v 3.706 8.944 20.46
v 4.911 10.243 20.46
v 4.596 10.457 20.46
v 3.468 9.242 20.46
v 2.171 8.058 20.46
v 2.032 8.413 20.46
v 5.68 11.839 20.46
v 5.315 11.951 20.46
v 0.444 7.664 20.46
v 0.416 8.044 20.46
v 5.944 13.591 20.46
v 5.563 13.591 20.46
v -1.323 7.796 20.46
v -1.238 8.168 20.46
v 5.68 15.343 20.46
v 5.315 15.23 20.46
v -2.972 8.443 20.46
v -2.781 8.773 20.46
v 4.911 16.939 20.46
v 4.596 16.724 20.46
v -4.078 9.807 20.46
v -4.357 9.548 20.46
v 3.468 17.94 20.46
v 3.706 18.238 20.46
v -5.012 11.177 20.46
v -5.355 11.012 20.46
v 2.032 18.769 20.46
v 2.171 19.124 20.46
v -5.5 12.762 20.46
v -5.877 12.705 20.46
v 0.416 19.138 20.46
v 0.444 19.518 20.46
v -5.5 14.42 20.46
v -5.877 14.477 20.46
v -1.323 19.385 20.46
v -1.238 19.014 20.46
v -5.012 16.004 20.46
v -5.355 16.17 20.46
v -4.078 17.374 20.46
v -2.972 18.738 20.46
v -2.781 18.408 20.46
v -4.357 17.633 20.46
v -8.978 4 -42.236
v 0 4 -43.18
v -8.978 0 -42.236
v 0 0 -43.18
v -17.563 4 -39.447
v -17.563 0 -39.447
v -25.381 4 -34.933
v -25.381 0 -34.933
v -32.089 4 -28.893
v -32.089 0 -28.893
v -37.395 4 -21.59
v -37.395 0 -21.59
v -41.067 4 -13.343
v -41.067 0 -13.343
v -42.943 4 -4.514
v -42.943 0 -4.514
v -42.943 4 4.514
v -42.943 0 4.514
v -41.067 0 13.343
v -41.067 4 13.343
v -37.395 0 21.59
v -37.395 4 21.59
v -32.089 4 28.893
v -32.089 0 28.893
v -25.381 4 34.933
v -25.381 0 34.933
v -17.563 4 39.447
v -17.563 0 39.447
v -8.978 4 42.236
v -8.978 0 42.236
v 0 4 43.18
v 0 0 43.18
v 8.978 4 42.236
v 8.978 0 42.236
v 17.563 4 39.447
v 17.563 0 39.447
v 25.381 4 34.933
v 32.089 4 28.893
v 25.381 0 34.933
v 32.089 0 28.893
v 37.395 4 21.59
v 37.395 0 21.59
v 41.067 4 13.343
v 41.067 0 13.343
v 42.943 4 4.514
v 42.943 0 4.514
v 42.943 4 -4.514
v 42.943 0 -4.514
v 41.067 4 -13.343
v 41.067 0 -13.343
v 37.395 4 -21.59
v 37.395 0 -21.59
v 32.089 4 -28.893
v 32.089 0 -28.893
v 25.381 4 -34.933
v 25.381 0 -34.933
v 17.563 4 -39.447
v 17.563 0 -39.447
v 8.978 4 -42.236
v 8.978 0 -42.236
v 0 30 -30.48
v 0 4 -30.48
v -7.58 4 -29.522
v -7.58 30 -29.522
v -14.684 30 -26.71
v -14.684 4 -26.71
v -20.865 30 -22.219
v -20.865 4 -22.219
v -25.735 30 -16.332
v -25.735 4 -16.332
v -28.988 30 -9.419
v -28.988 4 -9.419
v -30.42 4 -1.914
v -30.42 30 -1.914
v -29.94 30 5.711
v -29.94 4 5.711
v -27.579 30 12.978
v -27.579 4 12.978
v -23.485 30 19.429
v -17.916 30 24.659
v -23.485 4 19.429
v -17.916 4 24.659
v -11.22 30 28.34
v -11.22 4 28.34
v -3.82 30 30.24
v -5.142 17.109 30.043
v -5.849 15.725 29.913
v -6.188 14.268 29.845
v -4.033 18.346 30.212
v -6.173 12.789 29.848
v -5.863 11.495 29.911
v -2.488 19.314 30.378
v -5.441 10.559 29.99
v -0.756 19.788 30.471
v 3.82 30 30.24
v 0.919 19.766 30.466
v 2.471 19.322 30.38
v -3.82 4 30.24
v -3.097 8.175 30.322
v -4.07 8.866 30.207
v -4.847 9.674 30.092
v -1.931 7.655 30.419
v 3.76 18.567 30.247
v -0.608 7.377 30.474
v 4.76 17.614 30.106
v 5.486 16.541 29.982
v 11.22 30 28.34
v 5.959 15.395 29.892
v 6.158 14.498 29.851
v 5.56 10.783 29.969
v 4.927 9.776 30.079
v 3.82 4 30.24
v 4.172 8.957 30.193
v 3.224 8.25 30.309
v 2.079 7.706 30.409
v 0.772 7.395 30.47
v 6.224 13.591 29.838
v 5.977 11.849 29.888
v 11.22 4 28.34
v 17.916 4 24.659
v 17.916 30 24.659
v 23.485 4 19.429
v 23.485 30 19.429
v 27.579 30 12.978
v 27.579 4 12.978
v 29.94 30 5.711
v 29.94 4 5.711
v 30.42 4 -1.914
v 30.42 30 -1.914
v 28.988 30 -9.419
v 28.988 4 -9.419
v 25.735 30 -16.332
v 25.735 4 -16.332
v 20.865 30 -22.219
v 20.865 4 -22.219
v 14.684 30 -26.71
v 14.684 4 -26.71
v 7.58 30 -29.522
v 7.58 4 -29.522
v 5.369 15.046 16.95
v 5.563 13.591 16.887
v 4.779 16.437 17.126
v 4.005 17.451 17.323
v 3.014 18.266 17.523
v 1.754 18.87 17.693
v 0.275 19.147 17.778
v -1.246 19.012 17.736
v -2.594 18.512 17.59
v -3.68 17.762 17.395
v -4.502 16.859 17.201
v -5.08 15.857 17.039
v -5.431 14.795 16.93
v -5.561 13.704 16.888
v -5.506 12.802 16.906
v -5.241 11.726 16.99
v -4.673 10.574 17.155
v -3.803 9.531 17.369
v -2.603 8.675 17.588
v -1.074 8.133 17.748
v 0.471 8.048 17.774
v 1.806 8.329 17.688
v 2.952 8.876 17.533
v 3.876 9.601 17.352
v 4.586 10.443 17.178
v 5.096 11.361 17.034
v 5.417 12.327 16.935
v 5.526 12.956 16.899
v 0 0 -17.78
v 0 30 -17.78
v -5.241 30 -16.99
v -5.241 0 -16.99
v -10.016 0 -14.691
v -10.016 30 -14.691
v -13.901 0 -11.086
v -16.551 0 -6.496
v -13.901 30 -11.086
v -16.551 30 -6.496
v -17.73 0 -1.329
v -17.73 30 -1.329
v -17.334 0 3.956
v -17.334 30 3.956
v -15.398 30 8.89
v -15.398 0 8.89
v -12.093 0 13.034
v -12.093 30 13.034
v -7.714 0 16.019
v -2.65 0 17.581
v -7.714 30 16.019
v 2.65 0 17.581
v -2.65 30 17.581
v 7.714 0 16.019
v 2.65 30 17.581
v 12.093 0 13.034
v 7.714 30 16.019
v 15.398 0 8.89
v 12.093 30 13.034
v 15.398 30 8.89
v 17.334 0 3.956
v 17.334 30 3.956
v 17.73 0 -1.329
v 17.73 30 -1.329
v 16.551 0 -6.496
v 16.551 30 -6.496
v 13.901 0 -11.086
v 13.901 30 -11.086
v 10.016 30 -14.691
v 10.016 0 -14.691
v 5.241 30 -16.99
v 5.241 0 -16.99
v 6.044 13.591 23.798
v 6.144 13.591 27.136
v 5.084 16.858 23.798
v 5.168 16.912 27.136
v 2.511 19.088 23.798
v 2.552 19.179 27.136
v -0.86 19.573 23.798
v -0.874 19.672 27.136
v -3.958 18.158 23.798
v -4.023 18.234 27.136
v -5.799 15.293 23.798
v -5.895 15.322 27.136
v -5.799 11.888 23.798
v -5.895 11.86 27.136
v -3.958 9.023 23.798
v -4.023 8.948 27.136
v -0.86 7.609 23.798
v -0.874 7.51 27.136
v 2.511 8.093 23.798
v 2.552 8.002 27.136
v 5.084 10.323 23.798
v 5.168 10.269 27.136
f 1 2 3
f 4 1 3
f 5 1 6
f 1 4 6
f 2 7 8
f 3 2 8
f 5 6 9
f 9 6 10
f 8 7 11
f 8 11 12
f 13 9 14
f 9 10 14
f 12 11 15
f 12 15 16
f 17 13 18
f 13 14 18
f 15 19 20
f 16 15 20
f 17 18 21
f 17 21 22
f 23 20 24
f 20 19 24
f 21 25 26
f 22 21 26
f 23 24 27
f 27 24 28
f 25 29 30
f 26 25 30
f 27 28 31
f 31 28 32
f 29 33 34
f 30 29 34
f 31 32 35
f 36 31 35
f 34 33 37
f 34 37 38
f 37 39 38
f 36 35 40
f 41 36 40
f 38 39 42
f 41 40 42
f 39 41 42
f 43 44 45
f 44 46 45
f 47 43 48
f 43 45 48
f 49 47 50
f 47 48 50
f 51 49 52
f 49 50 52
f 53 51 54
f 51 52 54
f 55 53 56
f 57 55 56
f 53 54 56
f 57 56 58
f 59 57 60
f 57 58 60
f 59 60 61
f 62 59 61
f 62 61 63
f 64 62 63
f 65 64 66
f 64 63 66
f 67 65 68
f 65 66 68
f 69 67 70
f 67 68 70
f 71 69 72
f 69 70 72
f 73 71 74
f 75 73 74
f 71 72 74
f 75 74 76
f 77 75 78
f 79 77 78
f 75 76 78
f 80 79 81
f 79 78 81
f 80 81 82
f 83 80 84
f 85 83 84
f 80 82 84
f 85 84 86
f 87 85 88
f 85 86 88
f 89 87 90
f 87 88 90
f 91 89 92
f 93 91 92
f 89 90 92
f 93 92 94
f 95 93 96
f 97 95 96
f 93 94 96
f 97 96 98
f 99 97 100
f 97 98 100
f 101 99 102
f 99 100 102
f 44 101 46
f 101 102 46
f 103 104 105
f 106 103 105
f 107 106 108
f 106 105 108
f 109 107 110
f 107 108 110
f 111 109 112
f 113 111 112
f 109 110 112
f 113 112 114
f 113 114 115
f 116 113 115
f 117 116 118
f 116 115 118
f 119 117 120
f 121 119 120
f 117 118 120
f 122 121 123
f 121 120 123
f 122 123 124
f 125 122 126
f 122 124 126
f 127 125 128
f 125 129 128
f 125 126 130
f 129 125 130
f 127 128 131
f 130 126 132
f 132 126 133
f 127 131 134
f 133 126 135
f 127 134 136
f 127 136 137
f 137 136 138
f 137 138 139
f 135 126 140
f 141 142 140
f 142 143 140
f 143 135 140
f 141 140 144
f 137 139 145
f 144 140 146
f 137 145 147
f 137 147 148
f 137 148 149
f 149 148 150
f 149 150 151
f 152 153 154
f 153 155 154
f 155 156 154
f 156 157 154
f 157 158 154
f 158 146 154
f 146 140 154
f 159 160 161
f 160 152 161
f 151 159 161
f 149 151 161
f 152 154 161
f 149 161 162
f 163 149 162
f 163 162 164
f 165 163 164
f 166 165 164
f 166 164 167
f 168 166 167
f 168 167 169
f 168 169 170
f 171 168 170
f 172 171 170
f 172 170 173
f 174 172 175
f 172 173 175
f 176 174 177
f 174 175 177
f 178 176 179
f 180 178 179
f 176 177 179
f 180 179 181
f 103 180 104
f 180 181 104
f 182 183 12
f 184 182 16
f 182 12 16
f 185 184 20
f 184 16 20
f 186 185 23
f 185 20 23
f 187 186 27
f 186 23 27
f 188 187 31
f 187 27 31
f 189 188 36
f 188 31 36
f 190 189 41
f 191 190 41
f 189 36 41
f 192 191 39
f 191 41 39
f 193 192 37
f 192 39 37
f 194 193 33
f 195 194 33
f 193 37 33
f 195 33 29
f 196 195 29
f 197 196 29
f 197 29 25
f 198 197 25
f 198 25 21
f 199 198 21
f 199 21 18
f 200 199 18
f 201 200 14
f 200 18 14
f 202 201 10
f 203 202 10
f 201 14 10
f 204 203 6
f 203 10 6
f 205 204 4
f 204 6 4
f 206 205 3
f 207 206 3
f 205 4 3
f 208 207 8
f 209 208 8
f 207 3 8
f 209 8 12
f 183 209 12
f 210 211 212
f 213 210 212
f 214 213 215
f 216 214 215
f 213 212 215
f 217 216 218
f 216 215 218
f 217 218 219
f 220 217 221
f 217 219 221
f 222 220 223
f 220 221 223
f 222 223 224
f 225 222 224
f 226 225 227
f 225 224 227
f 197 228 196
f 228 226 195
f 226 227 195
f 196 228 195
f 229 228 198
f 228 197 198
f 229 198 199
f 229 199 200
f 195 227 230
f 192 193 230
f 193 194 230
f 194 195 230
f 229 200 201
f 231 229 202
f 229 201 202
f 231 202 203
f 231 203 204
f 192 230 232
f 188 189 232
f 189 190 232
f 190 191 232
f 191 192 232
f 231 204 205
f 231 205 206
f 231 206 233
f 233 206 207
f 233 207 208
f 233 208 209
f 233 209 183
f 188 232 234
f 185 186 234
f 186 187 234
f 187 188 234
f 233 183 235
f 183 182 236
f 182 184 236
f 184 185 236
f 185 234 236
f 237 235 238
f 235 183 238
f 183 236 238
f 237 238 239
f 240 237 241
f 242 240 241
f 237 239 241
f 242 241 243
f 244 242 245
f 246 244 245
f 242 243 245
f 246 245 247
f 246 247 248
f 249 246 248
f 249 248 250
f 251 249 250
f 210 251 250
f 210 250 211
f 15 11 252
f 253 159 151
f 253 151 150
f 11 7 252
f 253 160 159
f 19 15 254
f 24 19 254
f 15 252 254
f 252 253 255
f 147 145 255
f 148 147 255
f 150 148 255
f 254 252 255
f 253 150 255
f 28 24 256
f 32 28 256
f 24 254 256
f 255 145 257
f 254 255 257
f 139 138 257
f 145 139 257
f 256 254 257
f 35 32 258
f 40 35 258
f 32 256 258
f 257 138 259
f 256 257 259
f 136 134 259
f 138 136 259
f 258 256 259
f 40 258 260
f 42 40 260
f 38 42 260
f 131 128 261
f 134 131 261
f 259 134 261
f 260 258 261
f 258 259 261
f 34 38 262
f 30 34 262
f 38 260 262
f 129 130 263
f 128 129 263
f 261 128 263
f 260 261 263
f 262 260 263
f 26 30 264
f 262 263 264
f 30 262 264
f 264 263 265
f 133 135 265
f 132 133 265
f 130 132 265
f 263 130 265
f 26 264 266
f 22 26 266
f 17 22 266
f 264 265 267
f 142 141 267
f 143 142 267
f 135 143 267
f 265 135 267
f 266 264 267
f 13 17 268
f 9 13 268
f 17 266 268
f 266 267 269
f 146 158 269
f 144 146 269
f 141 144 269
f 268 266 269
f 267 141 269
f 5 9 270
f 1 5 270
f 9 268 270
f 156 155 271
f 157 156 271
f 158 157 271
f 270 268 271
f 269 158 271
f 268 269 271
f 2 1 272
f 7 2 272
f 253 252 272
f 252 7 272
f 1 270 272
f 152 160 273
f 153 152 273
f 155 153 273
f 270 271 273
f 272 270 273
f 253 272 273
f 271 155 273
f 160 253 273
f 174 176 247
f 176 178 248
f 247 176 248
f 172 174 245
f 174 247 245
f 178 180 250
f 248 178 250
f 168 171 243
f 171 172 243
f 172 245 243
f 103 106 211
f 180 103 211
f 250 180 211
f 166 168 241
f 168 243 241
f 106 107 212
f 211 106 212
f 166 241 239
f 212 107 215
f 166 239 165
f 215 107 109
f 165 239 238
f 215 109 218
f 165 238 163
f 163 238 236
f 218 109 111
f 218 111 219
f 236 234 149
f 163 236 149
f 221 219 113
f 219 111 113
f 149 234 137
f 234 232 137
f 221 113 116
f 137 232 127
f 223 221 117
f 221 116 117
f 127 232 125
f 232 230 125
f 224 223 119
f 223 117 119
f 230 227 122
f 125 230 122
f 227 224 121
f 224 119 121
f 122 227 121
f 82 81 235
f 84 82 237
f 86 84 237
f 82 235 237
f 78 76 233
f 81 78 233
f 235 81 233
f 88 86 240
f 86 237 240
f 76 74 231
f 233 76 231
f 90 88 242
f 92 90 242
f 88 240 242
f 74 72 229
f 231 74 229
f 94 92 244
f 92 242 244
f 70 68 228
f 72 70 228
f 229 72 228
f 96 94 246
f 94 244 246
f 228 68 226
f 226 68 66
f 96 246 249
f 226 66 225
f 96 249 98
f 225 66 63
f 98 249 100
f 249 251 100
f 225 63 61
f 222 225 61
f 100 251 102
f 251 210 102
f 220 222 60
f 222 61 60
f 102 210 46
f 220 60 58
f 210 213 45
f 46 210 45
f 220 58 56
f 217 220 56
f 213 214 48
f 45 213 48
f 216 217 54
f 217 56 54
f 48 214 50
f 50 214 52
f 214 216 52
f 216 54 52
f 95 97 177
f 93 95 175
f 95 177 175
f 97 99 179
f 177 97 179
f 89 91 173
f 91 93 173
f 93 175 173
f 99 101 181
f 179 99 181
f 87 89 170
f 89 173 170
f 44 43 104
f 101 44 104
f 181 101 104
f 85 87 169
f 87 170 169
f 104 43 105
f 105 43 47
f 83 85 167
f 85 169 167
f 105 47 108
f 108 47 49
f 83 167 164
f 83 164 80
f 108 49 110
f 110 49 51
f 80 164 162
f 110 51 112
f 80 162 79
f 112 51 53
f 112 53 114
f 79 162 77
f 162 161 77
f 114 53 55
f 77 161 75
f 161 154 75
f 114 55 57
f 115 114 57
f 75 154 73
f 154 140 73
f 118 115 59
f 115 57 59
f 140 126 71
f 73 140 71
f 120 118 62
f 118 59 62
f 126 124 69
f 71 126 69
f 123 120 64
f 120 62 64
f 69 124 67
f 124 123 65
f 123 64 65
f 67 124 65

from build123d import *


# Read off the part's stored shape, not the designer's step: 1/4 NPT Tapped Hole1
with BuildPart() as part:
    # Sketch1 → Revolve1 (revolve)
    with BuildSketch(Plane.XY, mode=Mode.PRIVATE) as revolve1_sk:
        Polygon((-17.78, 0), (-17.78, 30), (-30.48, 30), (-30.48, 4), (-43.18, 4), (-43.18, 0), align=None)
    revolve(revolve1_sk.sketch.rotate(Axis((0, 0, 0), (0, 1, 0)), 270), axis=Axis((0, 0, 0), (0, 1, 0)))

    # 1/4 NPT Tapped Hole1 outline → 1/4 NPT Tapped Hole1 (revolve, cut)
    with BuildSketch(Plane.XZ.offset(-13.590721134)):
        Polygon((5.5626, 20.46), (5.943676082, 20.46), (6.243695498, 30.480240418), (0, 30.480240418), (0, 16.886929185), (5.5626, 16.886929185), align=None)
    revolve(axis=Axis((0, 13.590721134, 0), (0, 0, 1)), mode=Mode.SUBTRACT)


solid = part.part
